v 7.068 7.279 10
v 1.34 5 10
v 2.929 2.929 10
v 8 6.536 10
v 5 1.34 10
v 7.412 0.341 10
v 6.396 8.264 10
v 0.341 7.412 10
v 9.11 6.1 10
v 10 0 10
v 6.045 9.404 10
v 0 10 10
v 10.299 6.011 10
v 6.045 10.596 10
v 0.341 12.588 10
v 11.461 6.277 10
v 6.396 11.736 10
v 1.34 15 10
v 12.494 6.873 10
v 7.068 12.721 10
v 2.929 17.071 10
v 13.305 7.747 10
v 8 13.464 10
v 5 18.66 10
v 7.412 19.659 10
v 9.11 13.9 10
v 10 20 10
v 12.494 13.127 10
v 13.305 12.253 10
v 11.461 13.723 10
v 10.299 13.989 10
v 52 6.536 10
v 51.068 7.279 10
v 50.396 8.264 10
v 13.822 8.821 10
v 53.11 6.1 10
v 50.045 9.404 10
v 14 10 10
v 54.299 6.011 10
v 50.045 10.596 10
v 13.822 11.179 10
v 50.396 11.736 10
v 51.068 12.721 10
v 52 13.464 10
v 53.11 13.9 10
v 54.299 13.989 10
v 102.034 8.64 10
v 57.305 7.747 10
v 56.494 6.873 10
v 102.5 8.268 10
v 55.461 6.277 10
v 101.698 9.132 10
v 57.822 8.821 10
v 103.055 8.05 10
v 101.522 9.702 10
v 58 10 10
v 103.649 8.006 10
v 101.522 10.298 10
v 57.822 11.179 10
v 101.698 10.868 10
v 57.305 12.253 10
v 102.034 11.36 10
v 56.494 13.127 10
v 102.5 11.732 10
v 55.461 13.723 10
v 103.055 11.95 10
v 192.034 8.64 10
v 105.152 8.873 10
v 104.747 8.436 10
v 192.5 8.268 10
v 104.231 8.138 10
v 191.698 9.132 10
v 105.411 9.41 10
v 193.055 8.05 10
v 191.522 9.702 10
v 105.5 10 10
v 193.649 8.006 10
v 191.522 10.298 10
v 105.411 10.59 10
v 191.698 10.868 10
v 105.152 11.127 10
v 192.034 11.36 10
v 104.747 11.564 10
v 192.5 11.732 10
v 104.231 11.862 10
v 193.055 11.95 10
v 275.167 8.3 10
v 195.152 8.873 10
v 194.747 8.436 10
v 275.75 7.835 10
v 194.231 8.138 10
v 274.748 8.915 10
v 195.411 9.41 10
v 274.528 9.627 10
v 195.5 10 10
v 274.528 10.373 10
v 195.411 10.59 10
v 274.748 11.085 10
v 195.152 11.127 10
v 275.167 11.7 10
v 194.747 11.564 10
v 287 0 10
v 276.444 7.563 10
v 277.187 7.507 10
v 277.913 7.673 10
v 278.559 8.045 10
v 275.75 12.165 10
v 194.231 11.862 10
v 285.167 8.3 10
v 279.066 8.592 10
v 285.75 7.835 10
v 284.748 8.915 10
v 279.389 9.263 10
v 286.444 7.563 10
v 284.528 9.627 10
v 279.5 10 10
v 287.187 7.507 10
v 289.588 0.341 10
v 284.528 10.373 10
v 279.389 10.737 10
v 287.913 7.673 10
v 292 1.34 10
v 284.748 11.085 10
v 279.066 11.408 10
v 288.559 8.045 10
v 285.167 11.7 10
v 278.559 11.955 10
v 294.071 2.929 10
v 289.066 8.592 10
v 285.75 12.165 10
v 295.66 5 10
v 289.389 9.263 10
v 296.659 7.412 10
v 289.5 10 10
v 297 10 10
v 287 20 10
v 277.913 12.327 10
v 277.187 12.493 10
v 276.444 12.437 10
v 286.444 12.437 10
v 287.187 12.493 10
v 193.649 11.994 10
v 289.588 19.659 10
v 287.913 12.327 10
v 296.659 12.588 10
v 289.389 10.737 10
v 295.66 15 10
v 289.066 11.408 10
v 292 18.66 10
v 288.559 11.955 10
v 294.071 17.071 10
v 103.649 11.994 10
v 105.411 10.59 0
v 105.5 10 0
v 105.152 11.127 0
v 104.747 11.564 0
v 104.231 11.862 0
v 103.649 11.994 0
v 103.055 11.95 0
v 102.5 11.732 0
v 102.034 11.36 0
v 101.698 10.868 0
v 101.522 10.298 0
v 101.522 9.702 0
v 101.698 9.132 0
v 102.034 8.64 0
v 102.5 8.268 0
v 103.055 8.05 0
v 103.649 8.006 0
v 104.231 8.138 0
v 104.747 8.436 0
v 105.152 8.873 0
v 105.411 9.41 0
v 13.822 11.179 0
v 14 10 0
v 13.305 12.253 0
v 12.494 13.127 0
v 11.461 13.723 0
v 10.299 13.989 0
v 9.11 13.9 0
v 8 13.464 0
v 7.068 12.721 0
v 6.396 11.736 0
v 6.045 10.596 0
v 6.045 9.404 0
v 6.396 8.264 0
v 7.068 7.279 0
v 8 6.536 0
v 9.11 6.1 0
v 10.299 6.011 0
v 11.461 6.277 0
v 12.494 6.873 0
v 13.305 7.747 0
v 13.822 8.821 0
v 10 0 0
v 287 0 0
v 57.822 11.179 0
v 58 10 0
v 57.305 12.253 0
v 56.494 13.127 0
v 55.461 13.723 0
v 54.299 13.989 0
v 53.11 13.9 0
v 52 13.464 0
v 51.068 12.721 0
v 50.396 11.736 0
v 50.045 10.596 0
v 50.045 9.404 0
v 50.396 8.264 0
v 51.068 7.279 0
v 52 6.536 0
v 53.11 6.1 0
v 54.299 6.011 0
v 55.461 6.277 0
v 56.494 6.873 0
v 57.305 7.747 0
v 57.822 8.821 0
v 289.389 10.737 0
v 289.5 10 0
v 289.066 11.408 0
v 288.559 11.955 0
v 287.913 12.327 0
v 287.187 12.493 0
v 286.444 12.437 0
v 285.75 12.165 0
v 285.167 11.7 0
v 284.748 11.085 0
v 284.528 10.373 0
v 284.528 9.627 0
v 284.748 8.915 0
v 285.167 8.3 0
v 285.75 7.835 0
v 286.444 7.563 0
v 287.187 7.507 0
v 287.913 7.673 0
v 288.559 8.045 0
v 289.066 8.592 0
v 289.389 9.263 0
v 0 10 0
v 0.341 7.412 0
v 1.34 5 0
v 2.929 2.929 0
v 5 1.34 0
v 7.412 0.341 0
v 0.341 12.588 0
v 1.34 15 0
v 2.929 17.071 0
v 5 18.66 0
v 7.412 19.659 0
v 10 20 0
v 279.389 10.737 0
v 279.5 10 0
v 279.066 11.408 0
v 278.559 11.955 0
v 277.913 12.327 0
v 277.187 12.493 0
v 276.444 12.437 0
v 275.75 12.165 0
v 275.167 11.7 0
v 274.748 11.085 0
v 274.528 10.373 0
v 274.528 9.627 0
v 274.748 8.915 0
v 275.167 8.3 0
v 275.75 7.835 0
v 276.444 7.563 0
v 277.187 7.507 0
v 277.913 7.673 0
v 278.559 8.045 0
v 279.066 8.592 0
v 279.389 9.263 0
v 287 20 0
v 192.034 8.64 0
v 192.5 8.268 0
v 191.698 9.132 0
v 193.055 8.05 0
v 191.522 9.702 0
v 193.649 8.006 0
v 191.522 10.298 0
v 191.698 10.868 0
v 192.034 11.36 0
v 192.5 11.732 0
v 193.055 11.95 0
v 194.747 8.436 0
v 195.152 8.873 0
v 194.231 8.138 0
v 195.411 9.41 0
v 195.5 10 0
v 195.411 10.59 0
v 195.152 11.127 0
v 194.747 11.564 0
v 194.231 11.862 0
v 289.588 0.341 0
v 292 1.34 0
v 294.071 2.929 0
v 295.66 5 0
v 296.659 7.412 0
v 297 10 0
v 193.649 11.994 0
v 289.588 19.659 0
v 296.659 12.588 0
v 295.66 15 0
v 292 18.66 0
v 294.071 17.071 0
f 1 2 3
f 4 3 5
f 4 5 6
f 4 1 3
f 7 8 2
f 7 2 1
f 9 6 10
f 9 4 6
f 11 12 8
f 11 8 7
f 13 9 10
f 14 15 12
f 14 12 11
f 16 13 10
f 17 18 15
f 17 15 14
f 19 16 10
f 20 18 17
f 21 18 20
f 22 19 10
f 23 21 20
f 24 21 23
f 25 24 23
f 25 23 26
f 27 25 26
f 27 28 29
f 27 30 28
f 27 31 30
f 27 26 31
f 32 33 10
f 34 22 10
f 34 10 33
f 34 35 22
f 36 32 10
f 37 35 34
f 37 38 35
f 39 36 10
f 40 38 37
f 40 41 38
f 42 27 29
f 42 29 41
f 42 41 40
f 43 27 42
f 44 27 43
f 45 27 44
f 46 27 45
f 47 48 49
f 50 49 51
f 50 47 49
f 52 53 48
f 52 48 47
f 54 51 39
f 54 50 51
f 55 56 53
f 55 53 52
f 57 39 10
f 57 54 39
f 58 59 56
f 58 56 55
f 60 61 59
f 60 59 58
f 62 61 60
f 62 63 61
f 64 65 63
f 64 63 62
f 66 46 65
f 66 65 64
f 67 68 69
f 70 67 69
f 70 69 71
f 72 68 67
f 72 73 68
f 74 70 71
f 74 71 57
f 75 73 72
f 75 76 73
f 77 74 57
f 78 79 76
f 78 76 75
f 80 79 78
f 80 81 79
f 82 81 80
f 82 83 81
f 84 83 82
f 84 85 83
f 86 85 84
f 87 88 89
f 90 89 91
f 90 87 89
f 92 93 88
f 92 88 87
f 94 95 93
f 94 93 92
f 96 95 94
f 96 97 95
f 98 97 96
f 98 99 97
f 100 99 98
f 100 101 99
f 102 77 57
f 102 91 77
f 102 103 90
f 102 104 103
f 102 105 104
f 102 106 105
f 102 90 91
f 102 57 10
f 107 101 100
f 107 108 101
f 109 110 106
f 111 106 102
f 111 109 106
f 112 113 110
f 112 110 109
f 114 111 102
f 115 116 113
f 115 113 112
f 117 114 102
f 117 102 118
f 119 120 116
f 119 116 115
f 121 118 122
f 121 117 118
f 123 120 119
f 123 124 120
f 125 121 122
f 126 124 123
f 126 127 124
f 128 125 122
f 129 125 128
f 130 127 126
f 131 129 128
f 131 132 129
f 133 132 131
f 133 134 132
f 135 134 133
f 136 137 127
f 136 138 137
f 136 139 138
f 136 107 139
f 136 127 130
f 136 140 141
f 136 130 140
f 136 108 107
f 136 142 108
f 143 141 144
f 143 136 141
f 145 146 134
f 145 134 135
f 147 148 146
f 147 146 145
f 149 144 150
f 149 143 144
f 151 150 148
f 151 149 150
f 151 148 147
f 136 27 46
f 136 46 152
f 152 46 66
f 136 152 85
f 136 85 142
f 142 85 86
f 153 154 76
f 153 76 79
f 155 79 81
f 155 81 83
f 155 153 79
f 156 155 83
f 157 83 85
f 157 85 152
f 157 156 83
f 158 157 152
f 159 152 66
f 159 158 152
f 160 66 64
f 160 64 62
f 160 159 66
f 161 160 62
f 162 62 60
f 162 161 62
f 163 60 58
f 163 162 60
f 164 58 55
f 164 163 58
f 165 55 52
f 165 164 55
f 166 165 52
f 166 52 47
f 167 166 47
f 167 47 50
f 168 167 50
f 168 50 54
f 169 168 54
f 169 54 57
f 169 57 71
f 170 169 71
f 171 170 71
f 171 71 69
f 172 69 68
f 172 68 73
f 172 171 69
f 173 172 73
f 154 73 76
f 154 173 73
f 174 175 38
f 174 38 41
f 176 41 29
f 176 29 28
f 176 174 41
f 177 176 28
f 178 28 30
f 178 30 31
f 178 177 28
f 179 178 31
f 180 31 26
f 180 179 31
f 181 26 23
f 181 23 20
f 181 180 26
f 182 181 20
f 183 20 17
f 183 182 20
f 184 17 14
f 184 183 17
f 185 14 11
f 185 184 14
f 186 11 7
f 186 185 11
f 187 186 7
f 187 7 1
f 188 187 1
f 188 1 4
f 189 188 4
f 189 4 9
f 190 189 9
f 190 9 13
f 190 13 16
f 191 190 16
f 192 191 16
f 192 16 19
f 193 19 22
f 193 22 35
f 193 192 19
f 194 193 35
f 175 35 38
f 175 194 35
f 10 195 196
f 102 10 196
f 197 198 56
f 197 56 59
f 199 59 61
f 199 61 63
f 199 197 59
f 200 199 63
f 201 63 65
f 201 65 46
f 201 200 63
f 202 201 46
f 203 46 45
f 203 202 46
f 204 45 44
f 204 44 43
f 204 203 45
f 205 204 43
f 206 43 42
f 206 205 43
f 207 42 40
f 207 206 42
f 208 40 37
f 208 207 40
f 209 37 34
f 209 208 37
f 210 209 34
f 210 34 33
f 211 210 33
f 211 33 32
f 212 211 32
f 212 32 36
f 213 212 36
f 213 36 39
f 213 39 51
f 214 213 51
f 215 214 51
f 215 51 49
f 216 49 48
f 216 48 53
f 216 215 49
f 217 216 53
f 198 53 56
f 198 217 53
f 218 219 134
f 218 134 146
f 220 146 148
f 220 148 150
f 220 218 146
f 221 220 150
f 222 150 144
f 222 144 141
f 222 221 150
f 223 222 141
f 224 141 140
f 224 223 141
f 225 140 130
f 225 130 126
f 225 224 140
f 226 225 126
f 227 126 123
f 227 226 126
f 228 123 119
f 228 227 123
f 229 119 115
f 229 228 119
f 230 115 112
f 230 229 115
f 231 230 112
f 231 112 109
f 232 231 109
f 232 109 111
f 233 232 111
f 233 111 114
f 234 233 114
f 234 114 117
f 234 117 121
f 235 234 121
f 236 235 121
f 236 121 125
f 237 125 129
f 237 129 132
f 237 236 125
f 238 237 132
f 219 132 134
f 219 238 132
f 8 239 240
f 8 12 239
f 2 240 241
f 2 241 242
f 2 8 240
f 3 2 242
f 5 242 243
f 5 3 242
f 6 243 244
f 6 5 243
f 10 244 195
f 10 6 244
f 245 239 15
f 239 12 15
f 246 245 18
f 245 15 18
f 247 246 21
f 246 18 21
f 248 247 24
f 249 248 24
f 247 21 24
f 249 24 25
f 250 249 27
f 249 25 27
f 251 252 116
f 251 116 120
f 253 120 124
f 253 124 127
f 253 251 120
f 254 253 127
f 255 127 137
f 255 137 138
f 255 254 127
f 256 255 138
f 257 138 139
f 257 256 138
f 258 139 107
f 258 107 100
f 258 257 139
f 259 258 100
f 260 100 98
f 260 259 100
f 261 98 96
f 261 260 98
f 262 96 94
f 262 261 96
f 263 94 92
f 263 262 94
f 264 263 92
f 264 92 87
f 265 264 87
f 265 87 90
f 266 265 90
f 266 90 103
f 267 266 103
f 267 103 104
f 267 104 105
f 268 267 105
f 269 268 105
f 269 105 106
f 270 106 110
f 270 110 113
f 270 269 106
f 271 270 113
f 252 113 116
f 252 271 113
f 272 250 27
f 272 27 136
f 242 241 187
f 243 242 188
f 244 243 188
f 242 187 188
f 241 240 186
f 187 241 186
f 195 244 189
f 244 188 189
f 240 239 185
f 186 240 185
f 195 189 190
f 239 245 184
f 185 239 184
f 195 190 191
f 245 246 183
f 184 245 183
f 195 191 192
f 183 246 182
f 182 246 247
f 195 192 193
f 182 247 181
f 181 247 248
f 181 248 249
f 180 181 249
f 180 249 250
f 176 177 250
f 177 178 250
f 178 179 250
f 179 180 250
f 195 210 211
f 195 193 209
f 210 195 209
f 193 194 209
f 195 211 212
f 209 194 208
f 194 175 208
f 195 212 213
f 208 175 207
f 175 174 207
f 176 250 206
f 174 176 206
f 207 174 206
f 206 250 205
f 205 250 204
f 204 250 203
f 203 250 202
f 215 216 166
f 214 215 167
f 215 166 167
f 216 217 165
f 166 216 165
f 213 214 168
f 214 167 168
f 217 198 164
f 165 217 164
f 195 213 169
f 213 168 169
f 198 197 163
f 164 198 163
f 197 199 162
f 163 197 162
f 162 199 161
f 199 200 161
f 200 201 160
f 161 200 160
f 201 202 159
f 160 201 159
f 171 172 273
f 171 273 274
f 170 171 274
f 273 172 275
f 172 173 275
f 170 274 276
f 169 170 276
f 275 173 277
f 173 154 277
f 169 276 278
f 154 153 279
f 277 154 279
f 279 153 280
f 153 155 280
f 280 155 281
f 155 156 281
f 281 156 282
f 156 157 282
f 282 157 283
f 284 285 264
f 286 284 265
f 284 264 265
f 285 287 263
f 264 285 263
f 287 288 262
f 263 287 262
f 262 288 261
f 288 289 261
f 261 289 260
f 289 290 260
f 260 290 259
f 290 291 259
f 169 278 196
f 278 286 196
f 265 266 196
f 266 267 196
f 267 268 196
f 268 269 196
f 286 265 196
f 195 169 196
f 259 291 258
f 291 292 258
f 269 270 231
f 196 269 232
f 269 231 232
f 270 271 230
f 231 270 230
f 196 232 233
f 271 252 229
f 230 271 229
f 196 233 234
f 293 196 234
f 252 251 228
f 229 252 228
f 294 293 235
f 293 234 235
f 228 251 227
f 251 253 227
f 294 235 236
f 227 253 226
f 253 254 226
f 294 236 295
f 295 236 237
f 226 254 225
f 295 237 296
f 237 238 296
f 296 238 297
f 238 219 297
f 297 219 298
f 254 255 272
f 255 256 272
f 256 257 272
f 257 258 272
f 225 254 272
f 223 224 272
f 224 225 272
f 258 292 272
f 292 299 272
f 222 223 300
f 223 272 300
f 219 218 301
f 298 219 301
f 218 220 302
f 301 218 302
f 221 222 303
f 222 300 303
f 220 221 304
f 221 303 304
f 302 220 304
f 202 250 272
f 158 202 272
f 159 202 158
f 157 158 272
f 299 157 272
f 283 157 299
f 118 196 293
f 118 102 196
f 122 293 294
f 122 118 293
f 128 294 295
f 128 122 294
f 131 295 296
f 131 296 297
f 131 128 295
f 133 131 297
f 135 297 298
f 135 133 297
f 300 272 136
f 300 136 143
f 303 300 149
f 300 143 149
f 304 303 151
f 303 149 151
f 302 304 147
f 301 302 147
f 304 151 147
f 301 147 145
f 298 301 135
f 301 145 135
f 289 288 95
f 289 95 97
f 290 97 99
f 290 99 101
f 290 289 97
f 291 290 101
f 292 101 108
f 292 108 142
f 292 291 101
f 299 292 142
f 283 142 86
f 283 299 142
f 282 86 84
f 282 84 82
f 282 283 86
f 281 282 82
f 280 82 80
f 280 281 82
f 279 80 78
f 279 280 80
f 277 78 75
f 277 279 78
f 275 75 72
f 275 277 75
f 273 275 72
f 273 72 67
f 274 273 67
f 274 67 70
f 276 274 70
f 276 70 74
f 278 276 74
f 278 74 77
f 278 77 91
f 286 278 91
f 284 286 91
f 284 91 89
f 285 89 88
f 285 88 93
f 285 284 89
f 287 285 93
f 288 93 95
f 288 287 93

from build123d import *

# Parameters (mm, degrees)
ESQUISSE1_W        = 297
ESQUISSE1_H        = 20
ESQUISSE1_R        = 4
ESQUISSE1_R_2      = 2.5
ESQUISSE1_R_3      = 2
BOSS_EXTRU_1_DEPTH = 10
CONG_1_R           = 10


with BuildPart() as part:
    # Esquisse1 → Boss.-Extru.1 (new body)
    with BuildSketch(Plane.XY):
        with Locations((148.5, 10)):
            Rectangle(ESQUISSE1_W, ESQUISSE1_H)
        with Locations((10, 10)):
            Circle(ESQUISSE1_R, mode=Mode.SUBTRACT)
        with Locations((54, 10)):
            Circle(ESQUISSE1_R, mode=Mode.SUBTRACT)
        with Locations((277, 10)):
            Circle(ESQUISSE1_R_2, mode=Mode.SUBTRACT)
        with Locations((287, 10)):
            Circle(ESQUISSE1_R_2, mode=Mode.SUBTRACT)
        with Locations((103.5, 10)):
            Circle(ESQUISSE1_R_3, mode=Mode.SUBTRACT)
        with Locations((193.5, 10)):
            Circle(ESQUISSE1_R_3, mode=Mode.SUBTRACT)
    extrude(amount=BOSS_EXTRU_1_DEPTH)

    # Congé1
    cong_1_edges = [part.edges().sort_by_distance(p)[0] for p in [
        (0, 0, 5),
        (0, 20, 5),
        (297, 0, 5),
        (297, 20, 5),
    ]]
    fillet(cong_1_edges, radius=CONG_1_R - 0.0001)  # a hair under: the kernel refuses the full size


solid = part.part
